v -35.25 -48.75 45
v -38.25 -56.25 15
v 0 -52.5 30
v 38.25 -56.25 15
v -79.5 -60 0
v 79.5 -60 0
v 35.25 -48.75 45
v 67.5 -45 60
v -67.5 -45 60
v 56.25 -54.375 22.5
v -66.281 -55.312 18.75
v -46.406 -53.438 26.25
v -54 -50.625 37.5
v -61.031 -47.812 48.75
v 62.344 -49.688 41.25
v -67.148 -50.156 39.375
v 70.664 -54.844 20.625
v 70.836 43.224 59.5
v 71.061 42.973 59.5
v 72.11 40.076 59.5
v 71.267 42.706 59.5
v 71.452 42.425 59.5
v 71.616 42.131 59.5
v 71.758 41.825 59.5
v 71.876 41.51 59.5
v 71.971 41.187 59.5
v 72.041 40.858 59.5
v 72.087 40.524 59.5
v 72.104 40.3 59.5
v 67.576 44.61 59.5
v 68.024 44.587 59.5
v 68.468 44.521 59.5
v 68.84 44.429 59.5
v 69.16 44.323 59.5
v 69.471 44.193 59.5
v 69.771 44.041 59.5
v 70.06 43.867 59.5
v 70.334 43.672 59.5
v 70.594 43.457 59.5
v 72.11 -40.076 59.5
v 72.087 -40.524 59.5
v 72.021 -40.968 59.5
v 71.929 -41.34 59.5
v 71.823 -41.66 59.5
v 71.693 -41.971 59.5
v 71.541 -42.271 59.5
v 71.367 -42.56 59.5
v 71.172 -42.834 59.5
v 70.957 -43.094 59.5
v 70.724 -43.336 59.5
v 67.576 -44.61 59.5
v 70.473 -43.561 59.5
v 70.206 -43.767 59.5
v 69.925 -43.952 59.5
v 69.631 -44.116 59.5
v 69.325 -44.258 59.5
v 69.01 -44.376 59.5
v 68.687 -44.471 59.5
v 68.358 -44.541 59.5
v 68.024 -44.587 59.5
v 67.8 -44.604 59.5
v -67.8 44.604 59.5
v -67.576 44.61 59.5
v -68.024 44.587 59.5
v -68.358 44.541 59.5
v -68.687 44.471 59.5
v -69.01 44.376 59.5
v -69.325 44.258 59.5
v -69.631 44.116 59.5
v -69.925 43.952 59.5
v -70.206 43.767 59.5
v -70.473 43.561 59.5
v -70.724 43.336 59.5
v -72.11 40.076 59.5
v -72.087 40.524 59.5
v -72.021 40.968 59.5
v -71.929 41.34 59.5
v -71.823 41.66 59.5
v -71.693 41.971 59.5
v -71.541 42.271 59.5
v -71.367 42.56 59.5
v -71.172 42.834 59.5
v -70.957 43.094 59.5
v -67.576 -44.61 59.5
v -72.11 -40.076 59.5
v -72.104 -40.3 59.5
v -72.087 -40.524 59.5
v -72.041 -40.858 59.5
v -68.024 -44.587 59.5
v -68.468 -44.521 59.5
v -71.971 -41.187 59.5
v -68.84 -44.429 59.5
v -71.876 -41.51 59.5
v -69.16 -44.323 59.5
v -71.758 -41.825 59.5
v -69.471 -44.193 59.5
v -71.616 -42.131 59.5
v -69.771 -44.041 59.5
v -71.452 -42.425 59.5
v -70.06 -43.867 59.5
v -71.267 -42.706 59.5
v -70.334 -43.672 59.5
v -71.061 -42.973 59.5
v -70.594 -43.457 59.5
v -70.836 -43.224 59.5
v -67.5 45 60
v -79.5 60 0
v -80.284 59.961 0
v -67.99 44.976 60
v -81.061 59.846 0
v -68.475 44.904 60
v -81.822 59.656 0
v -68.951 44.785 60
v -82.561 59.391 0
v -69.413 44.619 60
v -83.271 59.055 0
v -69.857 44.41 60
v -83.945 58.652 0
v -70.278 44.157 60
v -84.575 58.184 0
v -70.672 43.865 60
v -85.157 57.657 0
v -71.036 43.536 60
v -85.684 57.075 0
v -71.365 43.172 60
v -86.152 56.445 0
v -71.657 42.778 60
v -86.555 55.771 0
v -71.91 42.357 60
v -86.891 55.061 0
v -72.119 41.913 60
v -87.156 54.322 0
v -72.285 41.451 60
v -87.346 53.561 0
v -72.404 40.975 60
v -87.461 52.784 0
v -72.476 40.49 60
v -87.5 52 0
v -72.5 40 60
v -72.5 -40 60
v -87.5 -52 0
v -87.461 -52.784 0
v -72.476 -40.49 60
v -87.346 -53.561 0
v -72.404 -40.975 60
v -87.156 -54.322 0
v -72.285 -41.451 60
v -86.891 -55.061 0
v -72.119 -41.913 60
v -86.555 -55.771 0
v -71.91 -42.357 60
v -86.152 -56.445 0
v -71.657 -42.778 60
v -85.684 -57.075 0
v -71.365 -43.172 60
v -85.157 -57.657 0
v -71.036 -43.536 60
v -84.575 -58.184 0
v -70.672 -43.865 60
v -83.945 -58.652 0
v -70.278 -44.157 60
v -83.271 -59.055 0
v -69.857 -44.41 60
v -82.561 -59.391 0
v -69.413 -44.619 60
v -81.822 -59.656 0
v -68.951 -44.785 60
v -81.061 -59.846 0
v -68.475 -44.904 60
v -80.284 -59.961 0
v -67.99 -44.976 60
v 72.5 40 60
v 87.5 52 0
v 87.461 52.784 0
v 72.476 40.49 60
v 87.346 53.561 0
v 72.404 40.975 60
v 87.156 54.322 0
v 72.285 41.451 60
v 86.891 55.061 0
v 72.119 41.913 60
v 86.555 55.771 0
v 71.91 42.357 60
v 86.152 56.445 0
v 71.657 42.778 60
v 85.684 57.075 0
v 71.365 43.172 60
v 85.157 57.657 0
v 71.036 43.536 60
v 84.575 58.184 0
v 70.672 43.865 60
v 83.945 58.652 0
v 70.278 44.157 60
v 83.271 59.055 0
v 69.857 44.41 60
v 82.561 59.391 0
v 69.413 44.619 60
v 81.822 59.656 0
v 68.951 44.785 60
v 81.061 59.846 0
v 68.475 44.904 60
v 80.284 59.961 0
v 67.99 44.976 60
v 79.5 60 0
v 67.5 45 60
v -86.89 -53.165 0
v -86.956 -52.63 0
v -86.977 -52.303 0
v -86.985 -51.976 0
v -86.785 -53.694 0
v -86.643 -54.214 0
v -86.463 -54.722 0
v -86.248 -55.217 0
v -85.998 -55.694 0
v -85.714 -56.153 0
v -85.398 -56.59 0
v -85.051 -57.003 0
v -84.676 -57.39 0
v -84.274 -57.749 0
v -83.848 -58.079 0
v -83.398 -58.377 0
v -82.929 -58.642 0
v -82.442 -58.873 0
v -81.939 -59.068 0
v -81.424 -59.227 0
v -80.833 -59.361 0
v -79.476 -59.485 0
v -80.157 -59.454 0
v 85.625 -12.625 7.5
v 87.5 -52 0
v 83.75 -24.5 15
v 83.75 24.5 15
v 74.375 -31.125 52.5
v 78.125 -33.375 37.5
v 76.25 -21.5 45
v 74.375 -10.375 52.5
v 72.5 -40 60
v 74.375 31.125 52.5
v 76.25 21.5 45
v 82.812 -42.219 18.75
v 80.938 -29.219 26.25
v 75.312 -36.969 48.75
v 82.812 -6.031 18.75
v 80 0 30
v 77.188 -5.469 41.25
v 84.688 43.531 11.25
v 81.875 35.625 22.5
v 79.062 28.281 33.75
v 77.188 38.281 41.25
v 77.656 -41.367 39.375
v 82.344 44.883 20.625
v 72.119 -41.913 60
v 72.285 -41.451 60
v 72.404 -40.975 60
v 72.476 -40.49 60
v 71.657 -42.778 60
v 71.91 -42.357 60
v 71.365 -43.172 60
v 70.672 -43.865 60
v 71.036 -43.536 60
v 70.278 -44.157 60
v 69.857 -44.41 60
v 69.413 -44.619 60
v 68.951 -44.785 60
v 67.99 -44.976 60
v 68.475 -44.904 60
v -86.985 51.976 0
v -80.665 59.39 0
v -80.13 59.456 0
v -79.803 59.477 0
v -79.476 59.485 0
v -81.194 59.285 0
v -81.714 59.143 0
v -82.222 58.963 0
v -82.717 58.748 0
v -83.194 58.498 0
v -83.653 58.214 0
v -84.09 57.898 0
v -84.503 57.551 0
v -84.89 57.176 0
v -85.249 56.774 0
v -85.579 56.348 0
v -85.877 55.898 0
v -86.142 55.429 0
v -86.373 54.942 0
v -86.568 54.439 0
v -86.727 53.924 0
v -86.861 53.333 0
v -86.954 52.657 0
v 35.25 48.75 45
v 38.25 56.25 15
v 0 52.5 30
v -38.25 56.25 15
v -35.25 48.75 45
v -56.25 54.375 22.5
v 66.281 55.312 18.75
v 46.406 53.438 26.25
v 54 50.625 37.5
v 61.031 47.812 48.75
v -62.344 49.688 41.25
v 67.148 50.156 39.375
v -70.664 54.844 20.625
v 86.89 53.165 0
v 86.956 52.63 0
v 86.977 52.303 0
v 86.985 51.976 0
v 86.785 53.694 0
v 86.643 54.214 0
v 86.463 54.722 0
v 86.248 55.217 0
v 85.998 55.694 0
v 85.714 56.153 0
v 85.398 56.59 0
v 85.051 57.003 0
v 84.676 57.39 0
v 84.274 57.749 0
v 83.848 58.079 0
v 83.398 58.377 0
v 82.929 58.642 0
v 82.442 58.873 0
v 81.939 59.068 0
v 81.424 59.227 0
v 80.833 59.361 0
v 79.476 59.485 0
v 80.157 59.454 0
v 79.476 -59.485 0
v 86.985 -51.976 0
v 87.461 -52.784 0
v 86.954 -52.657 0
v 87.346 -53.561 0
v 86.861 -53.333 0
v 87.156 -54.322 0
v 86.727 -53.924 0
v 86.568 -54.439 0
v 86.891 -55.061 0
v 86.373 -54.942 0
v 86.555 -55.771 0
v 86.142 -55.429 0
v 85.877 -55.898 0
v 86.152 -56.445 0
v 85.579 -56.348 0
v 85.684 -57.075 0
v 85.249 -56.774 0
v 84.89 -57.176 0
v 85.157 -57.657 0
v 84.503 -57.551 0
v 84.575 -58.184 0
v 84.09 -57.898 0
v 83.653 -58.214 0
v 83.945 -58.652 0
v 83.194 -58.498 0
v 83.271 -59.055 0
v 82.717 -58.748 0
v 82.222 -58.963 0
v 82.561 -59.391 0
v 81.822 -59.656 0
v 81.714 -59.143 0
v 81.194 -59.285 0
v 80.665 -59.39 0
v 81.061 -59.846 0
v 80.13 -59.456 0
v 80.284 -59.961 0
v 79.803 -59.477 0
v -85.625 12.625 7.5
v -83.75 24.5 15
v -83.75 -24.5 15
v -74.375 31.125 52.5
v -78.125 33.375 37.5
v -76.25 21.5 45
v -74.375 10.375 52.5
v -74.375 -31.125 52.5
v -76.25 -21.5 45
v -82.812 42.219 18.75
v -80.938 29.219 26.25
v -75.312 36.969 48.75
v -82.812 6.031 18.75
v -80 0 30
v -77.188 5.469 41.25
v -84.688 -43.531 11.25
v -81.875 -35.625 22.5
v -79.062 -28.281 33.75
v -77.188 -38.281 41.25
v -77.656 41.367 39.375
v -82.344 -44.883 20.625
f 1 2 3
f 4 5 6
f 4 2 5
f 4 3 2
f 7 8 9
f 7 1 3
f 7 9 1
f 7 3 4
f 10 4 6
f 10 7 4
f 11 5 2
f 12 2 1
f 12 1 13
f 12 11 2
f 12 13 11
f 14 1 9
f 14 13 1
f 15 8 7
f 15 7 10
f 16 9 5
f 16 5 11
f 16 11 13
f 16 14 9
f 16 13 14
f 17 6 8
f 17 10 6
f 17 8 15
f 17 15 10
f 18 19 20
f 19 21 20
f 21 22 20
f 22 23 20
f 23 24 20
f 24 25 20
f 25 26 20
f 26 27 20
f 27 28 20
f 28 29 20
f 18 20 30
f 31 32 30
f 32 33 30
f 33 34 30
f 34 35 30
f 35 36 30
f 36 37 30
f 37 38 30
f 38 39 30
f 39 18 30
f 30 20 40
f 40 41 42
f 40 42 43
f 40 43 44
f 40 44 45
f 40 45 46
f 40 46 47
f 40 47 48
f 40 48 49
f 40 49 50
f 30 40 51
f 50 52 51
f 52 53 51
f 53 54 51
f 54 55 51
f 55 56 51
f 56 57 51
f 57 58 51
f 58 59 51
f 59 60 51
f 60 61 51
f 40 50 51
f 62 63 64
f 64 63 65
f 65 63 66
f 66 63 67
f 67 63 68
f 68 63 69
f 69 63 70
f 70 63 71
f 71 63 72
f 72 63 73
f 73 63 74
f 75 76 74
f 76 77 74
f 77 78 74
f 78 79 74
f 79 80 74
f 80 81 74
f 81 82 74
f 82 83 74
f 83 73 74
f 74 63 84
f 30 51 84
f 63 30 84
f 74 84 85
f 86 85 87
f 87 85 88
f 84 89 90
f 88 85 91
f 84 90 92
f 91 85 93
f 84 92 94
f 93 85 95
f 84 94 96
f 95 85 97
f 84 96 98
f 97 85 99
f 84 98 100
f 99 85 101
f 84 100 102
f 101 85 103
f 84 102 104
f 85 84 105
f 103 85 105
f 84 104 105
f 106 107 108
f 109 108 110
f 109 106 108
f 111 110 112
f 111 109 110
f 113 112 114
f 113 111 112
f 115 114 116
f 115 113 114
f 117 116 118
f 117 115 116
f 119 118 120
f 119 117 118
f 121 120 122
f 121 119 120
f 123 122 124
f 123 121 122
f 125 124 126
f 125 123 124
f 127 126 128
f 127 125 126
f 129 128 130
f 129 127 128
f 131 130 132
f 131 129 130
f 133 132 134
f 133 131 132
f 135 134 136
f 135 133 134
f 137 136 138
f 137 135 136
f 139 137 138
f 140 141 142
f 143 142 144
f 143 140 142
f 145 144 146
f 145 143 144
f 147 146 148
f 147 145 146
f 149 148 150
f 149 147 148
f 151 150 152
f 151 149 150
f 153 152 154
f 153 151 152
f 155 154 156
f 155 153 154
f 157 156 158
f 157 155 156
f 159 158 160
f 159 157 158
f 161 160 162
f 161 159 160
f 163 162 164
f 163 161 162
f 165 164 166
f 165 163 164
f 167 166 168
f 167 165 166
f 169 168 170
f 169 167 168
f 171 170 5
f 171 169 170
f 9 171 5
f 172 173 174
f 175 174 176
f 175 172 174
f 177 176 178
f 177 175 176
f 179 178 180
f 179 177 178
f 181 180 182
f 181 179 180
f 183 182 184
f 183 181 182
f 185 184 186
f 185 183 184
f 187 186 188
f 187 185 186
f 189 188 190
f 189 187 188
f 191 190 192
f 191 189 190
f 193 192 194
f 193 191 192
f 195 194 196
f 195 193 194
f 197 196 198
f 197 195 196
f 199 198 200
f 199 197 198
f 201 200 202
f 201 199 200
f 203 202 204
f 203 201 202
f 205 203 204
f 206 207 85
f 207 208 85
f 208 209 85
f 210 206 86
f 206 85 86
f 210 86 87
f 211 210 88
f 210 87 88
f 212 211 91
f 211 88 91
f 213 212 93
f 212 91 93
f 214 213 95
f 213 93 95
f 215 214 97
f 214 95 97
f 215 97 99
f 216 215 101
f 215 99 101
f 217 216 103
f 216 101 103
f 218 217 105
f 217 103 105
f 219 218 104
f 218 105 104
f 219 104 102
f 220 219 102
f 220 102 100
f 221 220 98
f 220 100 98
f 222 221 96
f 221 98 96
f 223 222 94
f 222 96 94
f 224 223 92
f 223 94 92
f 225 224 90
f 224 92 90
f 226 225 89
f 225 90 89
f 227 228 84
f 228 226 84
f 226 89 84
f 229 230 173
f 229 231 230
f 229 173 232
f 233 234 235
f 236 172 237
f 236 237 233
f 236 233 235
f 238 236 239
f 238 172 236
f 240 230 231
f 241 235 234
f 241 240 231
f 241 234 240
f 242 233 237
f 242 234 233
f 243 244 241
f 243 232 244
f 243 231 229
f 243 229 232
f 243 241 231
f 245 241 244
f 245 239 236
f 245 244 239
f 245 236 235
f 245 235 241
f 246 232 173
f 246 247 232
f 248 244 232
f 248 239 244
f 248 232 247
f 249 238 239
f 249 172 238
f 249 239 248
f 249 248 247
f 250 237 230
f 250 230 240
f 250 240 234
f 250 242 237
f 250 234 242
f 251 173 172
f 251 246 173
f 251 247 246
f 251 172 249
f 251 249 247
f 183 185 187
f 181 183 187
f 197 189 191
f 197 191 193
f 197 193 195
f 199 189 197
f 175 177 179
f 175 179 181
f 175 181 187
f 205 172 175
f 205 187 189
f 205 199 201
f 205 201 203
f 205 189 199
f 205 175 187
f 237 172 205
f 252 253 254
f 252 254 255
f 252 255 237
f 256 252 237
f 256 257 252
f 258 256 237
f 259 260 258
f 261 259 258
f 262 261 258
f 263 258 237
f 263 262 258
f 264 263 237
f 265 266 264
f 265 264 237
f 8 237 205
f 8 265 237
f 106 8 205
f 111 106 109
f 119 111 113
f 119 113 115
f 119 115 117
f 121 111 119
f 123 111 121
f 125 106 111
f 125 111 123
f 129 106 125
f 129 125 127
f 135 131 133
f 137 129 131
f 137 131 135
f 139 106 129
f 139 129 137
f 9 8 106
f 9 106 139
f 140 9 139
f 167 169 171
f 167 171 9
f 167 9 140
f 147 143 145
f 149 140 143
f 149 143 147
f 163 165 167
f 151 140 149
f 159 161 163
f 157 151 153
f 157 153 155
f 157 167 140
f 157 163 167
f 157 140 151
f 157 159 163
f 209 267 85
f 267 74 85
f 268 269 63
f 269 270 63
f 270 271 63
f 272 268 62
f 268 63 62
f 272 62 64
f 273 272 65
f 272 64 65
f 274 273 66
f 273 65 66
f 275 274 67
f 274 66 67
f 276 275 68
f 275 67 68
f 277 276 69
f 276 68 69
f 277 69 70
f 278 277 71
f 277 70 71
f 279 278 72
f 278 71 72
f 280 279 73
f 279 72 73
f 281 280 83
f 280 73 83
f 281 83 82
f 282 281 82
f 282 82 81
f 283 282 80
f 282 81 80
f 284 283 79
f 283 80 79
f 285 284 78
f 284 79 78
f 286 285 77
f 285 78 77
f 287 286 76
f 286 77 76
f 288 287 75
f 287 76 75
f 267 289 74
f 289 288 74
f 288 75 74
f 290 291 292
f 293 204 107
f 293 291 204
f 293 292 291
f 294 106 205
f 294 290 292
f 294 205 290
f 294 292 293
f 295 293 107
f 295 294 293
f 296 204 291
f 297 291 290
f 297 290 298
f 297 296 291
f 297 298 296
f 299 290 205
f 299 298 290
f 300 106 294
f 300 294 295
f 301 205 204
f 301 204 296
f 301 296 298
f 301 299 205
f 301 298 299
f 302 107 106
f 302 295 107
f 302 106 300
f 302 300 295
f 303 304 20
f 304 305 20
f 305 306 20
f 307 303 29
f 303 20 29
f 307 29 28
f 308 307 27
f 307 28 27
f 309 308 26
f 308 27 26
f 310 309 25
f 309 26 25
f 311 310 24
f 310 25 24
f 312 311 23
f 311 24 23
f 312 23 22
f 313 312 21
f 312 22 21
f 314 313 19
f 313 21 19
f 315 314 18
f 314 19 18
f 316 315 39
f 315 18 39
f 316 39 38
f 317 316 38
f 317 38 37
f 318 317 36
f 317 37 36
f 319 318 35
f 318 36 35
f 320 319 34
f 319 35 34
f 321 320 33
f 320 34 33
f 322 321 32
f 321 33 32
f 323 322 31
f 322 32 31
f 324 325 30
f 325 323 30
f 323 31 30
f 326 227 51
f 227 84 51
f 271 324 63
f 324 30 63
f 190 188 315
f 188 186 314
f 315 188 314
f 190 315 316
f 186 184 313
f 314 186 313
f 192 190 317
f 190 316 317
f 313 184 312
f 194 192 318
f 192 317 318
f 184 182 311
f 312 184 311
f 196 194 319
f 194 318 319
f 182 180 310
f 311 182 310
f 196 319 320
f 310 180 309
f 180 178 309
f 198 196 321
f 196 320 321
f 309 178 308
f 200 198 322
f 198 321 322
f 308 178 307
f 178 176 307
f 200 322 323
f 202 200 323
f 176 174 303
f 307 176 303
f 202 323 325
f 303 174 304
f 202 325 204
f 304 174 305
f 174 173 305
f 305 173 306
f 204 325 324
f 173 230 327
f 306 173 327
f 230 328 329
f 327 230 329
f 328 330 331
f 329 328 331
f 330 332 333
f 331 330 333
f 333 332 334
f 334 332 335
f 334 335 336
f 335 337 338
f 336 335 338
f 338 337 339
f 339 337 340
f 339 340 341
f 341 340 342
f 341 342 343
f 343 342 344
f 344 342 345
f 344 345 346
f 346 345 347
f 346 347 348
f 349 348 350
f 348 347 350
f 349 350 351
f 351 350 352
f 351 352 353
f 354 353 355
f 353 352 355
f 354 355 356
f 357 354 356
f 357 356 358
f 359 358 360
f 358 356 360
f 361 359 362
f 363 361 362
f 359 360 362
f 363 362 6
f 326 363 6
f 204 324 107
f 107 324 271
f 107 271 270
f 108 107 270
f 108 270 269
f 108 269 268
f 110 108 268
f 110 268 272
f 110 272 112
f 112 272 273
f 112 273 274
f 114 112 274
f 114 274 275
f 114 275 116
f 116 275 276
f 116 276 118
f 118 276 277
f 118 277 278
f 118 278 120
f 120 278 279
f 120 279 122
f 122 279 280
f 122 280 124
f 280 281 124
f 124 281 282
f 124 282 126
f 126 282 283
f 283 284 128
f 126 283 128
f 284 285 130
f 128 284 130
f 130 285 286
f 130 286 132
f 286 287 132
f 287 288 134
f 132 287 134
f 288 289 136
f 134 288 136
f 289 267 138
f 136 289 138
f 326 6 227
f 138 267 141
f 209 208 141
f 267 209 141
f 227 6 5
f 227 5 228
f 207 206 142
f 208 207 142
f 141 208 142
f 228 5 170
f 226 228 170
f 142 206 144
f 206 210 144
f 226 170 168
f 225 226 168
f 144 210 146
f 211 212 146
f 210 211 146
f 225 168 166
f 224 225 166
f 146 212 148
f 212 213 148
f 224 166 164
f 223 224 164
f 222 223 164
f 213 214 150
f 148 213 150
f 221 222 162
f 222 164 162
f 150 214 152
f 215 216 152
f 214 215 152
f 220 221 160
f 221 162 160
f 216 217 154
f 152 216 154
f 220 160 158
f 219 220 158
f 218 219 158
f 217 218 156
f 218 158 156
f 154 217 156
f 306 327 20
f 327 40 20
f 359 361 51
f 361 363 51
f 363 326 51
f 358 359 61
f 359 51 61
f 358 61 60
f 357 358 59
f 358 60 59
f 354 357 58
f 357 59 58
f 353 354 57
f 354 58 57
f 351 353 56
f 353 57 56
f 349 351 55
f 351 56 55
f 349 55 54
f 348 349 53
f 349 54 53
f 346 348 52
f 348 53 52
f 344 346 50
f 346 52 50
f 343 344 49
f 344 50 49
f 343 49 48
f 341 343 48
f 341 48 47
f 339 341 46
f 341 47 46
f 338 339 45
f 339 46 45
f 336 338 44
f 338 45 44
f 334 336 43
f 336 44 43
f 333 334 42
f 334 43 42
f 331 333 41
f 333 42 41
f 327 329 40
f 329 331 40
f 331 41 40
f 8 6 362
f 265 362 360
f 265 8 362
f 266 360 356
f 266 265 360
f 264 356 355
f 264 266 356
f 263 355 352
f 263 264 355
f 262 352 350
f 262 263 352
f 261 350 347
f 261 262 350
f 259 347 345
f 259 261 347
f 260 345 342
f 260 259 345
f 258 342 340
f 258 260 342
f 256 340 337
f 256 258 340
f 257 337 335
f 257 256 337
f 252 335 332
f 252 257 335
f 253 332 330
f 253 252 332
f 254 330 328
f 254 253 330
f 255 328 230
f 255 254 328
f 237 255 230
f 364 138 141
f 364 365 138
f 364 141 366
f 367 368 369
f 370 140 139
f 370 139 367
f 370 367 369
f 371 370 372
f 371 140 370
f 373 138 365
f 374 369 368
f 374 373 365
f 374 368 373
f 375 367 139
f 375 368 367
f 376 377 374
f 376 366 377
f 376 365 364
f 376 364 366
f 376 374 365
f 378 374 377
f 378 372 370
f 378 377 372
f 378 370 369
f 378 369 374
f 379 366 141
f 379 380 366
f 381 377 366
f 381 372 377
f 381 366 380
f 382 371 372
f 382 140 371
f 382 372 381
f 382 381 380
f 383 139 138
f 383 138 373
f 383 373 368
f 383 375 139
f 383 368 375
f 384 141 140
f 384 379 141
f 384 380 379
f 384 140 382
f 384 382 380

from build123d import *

# Parameters (mm, degrees)
F4_T = -0.5


with BuildPart() as f3:
    # F0 (on Top) → F3 section 0
    with BuildSketch(Plane.XY):
        with BuildLine():
            ThreePointArc((-87.5, -52), (-85.156854, -57.656854), (-79.5, -60))
            Line((-79.5, -60), (79.5, -60))
            ThreePointArc((79.5, -60), (85.156854, -57.656854), (87.5, -52))
            Line((87.5, -52), (87.5, 52))
            ThreePointArc((87.5, 52), (85.156854, 57.656854), (79.5, 60))
            Line((79.5, 60), (-79.5, 60))
            ThreePointArc((-79.5, 60), (-85.156854, 57.656854), (-87.5, 52))
            Line((-87.5, 52), (-87.5, -52))
        make_face()
    # F2 (on offset) → F3 section 1
    with BuildSketch(Plane.XY.offset(60)):
        with BuildLine():
            Line((67.5, 45), (-67.5, 45))
            ThreePointArc((-67.5, 45), (-71.035534, 43.535534), (-72.5, 40))
            Line((-72.5, 40), (-72.5, -40))
            ThreePointArc((-72.5, -40), (-71.035534, -43.535534), (-67.5, -45))
            Line((-67.5, -45), (67.5, -45))
            ThreePointArc((67.5, -45), (71.035534, -43.535534), (72.5, -40))
            Line((72.5, -40), (72.5, 40))
            ThreePointArc((72.5, 40), (71.035534, 43.535534), (67.5, 45))
        make_face()
    loft()

    # F4
    f4_openings = [f3.faces().sort_by_distance(p)[0] for p in [
        (0, 0, 0),
    ]]
    offset(amount=F4_T, openings=f4_openings)


solid = f3.part
